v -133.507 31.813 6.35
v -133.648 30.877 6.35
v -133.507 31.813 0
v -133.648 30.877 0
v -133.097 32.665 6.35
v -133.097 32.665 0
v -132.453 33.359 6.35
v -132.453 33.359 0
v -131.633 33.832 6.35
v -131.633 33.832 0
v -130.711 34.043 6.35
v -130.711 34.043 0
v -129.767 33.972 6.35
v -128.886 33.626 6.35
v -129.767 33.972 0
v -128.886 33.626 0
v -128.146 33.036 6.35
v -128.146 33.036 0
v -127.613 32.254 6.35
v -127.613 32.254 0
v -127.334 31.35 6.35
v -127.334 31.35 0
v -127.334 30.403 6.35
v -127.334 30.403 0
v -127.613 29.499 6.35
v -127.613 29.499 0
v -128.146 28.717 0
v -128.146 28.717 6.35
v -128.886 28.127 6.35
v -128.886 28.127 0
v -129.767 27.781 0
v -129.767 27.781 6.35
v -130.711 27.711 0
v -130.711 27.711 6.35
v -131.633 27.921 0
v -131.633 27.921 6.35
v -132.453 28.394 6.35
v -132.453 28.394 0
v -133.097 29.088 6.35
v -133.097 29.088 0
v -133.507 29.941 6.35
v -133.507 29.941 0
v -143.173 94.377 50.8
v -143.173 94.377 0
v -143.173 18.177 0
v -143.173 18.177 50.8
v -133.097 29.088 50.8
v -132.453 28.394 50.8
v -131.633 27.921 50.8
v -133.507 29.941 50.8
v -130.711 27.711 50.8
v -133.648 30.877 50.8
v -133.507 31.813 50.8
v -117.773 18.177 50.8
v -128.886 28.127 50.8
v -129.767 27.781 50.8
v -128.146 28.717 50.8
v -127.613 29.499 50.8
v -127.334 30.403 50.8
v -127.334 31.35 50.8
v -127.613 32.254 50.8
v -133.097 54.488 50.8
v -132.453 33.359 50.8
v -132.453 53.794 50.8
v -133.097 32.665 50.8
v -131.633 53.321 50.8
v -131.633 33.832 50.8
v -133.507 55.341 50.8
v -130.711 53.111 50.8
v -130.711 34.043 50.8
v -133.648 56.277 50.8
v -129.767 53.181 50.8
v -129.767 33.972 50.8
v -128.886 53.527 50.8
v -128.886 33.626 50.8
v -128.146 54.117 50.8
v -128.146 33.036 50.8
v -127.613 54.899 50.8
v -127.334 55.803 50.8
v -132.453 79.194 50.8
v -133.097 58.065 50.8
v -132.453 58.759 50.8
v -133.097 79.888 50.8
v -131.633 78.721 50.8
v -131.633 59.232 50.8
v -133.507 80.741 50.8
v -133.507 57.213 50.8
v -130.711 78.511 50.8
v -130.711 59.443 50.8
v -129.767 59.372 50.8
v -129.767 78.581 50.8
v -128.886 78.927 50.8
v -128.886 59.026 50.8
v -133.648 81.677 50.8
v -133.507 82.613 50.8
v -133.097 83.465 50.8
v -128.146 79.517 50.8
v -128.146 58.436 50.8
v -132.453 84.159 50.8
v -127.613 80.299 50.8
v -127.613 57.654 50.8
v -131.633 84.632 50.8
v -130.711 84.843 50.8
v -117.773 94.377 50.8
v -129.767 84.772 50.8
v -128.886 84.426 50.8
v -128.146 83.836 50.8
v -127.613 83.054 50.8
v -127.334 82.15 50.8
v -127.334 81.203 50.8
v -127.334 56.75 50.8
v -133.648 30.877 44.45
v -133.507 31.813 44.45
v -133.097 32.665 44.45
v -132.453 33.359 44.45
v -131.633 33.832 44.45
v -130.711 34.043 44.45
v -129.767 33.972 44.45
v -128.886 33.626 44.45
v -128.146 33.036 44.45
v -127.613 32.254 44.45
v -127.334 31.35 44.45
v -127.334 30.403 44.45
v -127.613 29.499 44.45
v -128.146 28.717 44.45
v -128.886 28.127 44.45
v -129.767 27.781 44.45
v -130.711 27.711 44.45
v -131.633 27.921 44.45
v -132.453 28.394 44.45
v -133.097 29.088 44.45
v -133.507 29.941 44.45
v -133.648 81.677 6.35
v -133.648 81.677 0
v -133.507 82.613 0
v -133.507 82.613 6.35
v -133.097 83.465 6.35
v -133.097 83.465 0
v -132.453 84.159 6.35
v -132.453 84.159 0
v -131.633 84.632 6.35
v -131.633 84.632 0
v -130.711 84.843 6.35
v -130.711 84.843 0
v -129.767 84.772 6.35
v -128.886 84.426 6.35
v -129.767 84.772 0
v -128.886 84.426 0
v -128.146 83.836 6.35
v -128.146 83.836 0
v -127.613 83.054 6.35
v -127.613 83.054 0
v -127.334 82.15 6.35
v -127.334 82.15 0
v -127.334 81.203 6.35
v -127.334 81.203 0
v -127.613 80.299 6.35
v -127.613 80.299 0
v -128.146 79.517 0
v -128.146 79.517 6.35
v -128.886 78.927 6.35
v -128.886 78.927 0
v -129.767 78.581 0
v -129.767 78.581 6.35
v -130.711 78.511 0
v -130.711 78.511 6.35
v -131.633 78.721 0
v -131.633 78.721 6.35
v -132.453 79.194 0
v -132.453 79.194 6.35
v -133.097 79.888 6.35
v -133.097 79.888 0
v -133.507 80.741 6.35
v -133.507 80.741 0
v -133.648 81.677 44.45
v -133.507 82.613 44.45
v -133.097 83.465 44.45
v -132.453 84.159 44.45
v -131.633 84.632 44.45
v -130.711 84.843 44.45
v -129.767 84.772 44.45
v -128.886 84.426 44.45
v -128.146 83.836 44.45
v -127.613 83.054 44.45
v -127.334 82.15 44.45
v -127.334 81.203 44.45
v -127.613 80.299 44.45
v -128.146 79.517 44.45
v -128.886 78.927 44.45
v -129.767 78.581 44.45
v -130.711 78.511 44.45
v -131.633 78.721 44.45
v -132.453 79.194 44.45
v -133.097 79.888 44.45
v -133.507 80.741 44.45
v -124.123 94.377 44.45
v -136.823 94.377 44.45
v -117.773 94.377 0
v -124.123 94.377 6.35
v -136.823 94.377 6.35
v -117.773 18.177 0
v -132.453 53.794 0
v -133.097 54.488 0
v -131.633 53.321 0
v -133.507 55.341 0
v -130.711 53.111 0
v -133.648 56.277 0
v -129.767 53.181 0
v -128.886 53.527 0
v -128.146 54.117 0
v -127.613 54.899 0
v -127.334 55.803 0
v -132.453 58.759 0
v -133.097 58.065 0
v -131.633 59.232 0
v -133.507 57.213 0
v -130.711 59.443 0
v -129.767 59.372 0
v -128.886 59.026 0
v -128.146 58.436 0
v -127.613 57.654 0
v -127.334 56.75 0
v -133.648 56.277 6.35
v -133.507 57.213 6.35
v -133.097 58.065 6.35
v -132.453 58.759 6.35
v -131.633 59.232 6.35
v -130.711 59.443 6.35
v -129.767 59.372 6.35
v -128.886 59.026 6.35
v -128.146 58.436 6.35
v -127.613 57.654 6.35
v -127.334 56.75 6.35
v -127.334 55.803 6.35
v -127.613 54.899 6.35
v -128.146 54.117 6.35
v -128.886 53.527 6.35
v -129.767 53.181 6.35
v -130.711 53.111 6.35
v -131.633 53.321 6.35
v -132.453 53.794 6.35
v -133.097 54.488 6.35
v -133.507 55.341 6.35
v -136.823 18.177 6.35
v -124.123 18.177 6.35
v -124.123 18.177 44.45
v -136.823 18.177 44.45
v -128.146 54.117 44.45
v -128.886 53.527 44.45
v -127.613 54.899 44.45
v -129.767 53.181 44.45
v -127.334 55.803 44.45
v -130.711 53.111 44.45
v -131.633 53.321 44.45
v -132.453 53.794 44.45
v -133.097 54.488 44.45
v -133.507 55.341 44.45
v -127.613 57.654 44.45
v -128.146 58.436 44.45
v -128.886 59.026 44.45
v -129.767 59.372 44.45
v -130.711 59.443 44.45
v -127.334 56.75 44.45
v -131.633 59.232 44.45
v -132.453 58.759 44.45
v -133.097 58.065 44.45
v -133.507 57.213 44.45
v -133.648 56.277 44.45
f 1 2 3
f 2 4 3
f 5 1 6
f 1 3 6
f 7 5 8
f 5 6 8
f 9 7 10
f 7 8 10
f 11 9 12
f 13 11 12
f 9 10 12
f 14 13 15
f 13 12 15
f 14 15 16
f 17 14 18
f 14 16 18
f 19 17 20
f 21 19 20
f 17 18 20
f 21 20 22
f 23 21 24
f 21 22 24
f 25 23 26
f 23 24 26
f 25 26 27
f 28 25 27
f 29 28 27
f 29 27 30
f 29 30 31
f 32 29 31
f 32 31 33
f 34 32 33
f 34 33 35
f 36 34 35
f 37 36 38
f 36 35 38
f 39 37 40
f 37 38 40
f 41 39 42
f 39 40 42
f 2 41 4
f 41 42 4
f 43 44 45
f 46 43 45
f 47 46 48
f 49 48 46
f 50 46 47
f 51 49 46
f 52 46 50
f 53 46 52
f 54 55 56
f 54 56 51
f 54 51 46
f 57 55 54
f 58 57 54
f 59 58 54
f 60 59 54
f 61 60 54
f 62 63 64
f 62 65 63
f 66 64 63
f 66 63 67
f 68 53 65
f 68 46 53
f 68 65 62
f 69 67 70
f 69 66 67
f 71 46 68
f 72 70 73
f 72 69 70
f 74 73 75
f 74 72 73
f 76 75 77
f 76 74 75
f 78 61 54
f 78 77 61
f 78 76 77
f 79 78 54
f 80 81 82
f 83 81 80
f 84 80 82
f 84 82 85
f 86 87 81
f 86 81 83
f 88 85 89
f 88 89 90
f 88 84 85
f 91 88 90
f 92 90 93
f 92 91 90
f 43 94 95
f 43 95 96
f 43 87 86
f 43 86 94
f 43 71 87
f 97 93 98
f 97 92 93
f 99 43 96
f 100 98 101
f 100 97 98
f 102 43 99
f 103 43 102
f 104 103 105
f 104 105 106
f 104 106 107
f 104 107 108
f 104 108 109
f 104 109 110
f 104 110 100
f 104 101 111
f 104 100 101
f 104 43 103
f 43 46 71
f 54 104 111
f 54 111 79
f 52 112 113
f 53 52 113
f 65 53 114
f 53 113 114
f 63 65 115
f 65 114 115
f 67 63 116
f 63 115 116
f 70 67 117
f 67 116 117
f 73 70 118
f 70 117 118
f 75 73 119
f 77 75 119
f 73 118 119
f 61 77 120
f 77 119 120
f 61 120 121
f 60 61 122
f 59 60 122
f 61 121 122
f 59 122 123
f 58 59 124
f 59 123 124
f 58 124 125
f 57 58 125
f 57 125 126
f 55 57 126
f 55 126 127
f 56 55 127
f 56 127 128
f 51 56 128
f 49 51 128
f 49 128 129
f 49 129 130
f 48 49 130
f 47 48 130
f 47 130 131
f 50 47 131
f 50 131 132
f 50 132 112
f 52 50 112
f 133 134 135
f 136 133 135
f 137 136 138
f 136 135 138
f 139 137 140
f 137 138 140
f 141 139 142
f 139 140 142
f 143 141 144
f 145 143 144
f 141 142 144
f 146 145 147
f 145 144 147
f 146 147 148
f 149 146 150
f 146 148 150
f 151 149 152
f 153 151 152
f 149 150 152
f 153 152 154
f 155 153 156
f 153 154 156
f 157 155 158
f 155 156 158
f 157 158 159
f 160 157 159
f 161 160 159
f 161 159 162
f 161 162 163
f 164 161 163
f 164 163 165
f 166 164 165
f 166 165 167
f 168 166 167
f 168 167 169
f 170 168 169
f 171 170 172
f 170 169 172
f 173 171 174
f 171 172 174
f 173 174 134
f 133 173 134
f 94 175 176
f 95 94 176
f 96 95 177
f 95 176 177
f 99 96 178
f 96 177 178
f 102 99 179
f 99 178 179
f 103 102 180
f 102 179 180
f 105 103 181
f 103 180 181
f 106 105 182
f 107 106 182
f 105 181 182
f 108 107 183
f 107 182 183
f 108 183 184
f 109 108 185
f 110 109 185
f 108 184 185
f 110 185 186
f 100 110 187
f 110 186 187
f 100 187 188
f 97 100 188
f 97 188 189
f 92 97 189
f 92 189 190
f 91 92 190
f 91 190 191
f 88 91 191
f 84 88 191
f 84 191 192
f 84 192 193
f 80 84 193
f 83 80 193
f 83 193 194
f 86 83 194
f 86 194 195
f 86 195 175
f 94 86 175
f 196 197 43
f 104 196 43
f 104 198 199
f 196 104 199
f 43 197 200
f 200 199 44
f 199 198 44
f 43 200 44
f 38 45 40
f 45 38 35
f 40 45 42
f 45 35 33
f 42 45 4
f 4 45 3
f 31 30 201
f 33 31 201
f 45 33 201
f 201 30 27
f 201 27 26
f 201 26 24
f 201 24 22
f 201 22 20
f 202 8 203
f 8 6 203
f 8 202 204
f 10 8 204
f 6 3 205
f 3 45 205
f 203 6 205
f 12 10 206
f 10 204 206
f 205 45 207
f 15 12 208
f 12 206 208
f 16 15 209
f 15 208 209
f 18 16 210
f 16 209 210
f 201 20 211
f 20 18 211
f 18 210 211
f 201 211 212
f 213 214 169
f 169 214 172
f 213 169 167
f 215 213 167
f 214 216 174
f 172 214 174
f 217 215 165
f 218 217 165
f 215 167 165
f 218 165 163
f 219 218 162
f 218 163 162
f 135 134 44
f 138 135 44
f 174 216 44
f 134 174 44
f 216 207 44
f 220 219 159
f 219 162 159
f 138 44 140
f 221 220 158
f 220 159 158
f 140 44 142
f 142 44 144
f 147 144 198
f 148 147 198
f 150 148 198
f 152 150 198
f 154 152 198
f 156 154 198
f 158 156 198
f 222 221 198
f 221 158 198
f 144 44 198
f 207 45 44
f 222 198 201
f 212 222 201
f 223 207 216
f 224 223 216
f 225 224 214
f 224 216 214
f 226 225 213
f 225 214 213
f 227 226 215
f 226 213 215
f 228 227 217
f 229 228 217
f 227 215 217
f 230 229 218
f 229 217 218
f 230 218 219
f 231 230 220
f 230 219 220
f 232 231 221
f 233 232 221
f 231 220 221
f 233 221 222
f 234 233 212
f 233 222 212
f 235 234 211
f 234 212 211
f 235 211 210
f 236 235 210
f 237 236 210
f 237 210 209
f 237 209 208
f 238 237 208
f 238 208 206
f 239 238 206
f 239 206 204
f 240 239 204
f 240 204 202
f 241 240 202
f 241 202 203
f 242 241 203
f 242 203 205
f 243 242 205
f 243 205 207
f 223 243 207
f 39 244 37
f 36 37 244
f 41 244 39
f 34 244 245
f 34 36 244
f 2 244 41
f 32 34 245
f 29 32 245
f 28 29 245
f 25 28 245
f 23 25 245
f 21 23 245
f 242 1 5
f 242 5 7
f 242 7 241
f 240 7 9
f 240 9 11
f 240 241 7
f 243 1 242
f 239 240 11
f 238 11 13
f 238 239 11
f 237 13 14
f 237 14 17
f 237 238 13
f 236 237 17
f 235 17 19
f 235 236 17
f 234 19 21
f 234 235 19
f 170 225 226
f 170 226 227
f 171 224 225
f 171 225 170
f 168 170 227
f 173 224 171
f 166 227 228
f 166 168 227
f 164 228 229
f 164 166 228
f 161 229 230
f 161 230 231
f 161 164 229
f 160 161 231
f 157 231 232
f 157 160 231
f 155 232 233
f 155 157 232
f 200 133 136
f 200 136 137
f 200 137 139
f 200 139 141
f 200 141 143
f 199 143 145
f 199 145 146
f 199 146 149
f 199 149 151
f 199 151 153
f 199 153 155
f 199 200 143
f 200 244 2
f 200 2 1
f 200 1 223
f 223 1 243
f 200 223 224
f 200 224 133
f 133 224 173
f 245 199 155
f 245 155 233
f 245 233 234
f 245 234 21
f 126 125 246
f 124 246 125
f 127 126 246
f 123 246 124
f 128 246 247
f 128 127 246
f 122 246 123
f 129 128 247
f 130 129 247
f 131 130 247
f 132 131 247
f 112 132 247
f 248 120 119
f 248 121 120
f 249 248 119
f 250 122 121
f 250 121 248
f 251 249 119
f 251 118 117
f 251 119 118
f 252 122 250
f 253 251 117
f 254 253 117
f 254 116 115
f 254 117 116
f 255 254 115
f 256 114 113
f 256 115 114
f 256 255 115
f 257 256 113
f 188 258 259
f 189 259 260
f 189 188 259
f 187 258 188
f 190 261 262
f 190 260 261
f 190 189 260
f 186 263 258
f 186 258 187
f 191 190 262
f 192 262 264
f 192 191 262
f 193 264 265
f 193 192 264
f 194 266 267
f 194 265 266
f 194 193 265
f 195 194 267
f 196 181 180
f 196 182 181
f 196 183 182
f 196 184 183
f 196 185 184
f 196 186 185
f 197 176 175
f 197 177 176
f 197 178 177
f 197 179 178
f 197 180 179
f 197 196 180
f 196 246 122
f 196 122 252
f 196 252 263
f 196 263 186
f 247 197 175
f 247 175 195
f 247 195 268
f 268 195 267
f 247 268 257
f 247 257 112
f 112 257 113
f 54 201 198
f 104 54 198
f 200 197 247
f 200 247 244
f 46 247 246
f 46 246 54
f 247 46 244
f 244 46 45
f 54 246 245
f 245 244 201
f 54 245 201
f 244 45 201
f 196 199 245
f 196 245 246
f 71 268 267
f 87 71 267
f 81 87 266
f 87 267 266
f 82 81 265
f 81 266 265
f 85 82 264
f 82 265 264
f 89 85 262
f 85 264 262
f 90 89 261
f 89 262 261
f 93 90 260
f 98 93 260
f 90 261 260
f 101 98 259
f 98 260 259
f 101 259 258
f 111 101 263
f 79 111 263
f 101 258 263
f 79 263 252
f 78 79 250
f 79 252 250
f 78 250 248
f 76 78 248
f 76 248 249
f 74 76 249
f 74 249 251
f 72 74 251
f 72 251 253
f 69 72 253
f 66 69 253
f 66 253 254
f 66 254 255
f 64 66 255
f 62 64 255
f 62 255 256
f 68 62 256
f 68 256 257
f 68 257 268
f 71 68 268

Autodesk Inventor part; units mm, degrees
ref_plane "YZ Plane" through (0, 0, 0) normal (1, 0, 0) x (0, 1, 0)
ref_plane "XZ Plane" through (0, 0, 0) normal (0, 1, 0) x (-1, 0, 0)
ref_plane "XY Plane" through (0, 0, 0) normal (0, 0, 1) x (1, 0, 0)
sketch "Sketch1" plane through (0, 0, 0) normal (0, 0, 1) x (1, 0, 0)
  line L0 (-143.1734, 18.1767) -> (-117.7734, 18.1767)
  line L1 (-117.7734, 18.1767) -> (-117.7734, 94.3767)
  line L2 (-117.7734, 94.3767) -> (-143.1734, 94.3767)
  line L3 (-143.1734, 94.3767) -> (-143.1734, 18.1767)
  point P0 (0, 0)
  dimension "d0" = 76.2
  dimension "d1" = 25.4
extrude "Extrusion1" add sketch "Sketch1" along normal blind 50.8
sketch "Sketch2" plane through (-143.1734, 94.3767, 0) normal (0, 1, 0) x (1, 0, 0)
  line L0 (25.4, 0) -> (0, 0) projected
  line L1 (0, 0) -> (0, -50.8) projected
  line L2 (25.4, -50.8) -> (0, -50.8) projected
  line L3 (25.4, 0) -> (25.4, -50.8) projected
  line L4 (6.35, -44.45) -> (6.35, -6.35)
  line L5 (6.35, -6.35) -> (19.05, -6.35)
  line L6 (19.05, -6.35) -> (19.05, -44.45)
  line L7 (19.05, -44.45) -> (6.35, -44.45)
  point P0 (143.1734, 0)
  dimension "d4" = 6.35
extrude "Extrusion2" cut sketch "Sketch2" against normal through all contours L4 L5 L6 L7
sketch "Sketch3" plane through (0, 0, 0) normal (0, 0, -1) x (-1, 0, 0)
  line L0 (143.1734, 18.1767) -> (117.7734, 18.1767) projected
  line L1 (130.4734, 18.1767) -> (130.4734, 94.3767) construction
  line L2 (136.8234, 94.3767) -> (124.1234, 94.3767) projected
  circle A0 centre (130.4734, 30.8767) radius 3.175
  circle A1 centre (130.4734, 56.2767) radius 3.175
  circle A2 centre (130.4734, 81.6767) radius 3.175
  point P0 (0, 0)
  dimension "d7" = 6.35
  dimension "d8" = 12.7
  dimension "d11" = 25.4
extrude "Extrusion3" cut sketch "Sketch3" against normal through all
properties part number "2AM-17-03-Frame Block"
